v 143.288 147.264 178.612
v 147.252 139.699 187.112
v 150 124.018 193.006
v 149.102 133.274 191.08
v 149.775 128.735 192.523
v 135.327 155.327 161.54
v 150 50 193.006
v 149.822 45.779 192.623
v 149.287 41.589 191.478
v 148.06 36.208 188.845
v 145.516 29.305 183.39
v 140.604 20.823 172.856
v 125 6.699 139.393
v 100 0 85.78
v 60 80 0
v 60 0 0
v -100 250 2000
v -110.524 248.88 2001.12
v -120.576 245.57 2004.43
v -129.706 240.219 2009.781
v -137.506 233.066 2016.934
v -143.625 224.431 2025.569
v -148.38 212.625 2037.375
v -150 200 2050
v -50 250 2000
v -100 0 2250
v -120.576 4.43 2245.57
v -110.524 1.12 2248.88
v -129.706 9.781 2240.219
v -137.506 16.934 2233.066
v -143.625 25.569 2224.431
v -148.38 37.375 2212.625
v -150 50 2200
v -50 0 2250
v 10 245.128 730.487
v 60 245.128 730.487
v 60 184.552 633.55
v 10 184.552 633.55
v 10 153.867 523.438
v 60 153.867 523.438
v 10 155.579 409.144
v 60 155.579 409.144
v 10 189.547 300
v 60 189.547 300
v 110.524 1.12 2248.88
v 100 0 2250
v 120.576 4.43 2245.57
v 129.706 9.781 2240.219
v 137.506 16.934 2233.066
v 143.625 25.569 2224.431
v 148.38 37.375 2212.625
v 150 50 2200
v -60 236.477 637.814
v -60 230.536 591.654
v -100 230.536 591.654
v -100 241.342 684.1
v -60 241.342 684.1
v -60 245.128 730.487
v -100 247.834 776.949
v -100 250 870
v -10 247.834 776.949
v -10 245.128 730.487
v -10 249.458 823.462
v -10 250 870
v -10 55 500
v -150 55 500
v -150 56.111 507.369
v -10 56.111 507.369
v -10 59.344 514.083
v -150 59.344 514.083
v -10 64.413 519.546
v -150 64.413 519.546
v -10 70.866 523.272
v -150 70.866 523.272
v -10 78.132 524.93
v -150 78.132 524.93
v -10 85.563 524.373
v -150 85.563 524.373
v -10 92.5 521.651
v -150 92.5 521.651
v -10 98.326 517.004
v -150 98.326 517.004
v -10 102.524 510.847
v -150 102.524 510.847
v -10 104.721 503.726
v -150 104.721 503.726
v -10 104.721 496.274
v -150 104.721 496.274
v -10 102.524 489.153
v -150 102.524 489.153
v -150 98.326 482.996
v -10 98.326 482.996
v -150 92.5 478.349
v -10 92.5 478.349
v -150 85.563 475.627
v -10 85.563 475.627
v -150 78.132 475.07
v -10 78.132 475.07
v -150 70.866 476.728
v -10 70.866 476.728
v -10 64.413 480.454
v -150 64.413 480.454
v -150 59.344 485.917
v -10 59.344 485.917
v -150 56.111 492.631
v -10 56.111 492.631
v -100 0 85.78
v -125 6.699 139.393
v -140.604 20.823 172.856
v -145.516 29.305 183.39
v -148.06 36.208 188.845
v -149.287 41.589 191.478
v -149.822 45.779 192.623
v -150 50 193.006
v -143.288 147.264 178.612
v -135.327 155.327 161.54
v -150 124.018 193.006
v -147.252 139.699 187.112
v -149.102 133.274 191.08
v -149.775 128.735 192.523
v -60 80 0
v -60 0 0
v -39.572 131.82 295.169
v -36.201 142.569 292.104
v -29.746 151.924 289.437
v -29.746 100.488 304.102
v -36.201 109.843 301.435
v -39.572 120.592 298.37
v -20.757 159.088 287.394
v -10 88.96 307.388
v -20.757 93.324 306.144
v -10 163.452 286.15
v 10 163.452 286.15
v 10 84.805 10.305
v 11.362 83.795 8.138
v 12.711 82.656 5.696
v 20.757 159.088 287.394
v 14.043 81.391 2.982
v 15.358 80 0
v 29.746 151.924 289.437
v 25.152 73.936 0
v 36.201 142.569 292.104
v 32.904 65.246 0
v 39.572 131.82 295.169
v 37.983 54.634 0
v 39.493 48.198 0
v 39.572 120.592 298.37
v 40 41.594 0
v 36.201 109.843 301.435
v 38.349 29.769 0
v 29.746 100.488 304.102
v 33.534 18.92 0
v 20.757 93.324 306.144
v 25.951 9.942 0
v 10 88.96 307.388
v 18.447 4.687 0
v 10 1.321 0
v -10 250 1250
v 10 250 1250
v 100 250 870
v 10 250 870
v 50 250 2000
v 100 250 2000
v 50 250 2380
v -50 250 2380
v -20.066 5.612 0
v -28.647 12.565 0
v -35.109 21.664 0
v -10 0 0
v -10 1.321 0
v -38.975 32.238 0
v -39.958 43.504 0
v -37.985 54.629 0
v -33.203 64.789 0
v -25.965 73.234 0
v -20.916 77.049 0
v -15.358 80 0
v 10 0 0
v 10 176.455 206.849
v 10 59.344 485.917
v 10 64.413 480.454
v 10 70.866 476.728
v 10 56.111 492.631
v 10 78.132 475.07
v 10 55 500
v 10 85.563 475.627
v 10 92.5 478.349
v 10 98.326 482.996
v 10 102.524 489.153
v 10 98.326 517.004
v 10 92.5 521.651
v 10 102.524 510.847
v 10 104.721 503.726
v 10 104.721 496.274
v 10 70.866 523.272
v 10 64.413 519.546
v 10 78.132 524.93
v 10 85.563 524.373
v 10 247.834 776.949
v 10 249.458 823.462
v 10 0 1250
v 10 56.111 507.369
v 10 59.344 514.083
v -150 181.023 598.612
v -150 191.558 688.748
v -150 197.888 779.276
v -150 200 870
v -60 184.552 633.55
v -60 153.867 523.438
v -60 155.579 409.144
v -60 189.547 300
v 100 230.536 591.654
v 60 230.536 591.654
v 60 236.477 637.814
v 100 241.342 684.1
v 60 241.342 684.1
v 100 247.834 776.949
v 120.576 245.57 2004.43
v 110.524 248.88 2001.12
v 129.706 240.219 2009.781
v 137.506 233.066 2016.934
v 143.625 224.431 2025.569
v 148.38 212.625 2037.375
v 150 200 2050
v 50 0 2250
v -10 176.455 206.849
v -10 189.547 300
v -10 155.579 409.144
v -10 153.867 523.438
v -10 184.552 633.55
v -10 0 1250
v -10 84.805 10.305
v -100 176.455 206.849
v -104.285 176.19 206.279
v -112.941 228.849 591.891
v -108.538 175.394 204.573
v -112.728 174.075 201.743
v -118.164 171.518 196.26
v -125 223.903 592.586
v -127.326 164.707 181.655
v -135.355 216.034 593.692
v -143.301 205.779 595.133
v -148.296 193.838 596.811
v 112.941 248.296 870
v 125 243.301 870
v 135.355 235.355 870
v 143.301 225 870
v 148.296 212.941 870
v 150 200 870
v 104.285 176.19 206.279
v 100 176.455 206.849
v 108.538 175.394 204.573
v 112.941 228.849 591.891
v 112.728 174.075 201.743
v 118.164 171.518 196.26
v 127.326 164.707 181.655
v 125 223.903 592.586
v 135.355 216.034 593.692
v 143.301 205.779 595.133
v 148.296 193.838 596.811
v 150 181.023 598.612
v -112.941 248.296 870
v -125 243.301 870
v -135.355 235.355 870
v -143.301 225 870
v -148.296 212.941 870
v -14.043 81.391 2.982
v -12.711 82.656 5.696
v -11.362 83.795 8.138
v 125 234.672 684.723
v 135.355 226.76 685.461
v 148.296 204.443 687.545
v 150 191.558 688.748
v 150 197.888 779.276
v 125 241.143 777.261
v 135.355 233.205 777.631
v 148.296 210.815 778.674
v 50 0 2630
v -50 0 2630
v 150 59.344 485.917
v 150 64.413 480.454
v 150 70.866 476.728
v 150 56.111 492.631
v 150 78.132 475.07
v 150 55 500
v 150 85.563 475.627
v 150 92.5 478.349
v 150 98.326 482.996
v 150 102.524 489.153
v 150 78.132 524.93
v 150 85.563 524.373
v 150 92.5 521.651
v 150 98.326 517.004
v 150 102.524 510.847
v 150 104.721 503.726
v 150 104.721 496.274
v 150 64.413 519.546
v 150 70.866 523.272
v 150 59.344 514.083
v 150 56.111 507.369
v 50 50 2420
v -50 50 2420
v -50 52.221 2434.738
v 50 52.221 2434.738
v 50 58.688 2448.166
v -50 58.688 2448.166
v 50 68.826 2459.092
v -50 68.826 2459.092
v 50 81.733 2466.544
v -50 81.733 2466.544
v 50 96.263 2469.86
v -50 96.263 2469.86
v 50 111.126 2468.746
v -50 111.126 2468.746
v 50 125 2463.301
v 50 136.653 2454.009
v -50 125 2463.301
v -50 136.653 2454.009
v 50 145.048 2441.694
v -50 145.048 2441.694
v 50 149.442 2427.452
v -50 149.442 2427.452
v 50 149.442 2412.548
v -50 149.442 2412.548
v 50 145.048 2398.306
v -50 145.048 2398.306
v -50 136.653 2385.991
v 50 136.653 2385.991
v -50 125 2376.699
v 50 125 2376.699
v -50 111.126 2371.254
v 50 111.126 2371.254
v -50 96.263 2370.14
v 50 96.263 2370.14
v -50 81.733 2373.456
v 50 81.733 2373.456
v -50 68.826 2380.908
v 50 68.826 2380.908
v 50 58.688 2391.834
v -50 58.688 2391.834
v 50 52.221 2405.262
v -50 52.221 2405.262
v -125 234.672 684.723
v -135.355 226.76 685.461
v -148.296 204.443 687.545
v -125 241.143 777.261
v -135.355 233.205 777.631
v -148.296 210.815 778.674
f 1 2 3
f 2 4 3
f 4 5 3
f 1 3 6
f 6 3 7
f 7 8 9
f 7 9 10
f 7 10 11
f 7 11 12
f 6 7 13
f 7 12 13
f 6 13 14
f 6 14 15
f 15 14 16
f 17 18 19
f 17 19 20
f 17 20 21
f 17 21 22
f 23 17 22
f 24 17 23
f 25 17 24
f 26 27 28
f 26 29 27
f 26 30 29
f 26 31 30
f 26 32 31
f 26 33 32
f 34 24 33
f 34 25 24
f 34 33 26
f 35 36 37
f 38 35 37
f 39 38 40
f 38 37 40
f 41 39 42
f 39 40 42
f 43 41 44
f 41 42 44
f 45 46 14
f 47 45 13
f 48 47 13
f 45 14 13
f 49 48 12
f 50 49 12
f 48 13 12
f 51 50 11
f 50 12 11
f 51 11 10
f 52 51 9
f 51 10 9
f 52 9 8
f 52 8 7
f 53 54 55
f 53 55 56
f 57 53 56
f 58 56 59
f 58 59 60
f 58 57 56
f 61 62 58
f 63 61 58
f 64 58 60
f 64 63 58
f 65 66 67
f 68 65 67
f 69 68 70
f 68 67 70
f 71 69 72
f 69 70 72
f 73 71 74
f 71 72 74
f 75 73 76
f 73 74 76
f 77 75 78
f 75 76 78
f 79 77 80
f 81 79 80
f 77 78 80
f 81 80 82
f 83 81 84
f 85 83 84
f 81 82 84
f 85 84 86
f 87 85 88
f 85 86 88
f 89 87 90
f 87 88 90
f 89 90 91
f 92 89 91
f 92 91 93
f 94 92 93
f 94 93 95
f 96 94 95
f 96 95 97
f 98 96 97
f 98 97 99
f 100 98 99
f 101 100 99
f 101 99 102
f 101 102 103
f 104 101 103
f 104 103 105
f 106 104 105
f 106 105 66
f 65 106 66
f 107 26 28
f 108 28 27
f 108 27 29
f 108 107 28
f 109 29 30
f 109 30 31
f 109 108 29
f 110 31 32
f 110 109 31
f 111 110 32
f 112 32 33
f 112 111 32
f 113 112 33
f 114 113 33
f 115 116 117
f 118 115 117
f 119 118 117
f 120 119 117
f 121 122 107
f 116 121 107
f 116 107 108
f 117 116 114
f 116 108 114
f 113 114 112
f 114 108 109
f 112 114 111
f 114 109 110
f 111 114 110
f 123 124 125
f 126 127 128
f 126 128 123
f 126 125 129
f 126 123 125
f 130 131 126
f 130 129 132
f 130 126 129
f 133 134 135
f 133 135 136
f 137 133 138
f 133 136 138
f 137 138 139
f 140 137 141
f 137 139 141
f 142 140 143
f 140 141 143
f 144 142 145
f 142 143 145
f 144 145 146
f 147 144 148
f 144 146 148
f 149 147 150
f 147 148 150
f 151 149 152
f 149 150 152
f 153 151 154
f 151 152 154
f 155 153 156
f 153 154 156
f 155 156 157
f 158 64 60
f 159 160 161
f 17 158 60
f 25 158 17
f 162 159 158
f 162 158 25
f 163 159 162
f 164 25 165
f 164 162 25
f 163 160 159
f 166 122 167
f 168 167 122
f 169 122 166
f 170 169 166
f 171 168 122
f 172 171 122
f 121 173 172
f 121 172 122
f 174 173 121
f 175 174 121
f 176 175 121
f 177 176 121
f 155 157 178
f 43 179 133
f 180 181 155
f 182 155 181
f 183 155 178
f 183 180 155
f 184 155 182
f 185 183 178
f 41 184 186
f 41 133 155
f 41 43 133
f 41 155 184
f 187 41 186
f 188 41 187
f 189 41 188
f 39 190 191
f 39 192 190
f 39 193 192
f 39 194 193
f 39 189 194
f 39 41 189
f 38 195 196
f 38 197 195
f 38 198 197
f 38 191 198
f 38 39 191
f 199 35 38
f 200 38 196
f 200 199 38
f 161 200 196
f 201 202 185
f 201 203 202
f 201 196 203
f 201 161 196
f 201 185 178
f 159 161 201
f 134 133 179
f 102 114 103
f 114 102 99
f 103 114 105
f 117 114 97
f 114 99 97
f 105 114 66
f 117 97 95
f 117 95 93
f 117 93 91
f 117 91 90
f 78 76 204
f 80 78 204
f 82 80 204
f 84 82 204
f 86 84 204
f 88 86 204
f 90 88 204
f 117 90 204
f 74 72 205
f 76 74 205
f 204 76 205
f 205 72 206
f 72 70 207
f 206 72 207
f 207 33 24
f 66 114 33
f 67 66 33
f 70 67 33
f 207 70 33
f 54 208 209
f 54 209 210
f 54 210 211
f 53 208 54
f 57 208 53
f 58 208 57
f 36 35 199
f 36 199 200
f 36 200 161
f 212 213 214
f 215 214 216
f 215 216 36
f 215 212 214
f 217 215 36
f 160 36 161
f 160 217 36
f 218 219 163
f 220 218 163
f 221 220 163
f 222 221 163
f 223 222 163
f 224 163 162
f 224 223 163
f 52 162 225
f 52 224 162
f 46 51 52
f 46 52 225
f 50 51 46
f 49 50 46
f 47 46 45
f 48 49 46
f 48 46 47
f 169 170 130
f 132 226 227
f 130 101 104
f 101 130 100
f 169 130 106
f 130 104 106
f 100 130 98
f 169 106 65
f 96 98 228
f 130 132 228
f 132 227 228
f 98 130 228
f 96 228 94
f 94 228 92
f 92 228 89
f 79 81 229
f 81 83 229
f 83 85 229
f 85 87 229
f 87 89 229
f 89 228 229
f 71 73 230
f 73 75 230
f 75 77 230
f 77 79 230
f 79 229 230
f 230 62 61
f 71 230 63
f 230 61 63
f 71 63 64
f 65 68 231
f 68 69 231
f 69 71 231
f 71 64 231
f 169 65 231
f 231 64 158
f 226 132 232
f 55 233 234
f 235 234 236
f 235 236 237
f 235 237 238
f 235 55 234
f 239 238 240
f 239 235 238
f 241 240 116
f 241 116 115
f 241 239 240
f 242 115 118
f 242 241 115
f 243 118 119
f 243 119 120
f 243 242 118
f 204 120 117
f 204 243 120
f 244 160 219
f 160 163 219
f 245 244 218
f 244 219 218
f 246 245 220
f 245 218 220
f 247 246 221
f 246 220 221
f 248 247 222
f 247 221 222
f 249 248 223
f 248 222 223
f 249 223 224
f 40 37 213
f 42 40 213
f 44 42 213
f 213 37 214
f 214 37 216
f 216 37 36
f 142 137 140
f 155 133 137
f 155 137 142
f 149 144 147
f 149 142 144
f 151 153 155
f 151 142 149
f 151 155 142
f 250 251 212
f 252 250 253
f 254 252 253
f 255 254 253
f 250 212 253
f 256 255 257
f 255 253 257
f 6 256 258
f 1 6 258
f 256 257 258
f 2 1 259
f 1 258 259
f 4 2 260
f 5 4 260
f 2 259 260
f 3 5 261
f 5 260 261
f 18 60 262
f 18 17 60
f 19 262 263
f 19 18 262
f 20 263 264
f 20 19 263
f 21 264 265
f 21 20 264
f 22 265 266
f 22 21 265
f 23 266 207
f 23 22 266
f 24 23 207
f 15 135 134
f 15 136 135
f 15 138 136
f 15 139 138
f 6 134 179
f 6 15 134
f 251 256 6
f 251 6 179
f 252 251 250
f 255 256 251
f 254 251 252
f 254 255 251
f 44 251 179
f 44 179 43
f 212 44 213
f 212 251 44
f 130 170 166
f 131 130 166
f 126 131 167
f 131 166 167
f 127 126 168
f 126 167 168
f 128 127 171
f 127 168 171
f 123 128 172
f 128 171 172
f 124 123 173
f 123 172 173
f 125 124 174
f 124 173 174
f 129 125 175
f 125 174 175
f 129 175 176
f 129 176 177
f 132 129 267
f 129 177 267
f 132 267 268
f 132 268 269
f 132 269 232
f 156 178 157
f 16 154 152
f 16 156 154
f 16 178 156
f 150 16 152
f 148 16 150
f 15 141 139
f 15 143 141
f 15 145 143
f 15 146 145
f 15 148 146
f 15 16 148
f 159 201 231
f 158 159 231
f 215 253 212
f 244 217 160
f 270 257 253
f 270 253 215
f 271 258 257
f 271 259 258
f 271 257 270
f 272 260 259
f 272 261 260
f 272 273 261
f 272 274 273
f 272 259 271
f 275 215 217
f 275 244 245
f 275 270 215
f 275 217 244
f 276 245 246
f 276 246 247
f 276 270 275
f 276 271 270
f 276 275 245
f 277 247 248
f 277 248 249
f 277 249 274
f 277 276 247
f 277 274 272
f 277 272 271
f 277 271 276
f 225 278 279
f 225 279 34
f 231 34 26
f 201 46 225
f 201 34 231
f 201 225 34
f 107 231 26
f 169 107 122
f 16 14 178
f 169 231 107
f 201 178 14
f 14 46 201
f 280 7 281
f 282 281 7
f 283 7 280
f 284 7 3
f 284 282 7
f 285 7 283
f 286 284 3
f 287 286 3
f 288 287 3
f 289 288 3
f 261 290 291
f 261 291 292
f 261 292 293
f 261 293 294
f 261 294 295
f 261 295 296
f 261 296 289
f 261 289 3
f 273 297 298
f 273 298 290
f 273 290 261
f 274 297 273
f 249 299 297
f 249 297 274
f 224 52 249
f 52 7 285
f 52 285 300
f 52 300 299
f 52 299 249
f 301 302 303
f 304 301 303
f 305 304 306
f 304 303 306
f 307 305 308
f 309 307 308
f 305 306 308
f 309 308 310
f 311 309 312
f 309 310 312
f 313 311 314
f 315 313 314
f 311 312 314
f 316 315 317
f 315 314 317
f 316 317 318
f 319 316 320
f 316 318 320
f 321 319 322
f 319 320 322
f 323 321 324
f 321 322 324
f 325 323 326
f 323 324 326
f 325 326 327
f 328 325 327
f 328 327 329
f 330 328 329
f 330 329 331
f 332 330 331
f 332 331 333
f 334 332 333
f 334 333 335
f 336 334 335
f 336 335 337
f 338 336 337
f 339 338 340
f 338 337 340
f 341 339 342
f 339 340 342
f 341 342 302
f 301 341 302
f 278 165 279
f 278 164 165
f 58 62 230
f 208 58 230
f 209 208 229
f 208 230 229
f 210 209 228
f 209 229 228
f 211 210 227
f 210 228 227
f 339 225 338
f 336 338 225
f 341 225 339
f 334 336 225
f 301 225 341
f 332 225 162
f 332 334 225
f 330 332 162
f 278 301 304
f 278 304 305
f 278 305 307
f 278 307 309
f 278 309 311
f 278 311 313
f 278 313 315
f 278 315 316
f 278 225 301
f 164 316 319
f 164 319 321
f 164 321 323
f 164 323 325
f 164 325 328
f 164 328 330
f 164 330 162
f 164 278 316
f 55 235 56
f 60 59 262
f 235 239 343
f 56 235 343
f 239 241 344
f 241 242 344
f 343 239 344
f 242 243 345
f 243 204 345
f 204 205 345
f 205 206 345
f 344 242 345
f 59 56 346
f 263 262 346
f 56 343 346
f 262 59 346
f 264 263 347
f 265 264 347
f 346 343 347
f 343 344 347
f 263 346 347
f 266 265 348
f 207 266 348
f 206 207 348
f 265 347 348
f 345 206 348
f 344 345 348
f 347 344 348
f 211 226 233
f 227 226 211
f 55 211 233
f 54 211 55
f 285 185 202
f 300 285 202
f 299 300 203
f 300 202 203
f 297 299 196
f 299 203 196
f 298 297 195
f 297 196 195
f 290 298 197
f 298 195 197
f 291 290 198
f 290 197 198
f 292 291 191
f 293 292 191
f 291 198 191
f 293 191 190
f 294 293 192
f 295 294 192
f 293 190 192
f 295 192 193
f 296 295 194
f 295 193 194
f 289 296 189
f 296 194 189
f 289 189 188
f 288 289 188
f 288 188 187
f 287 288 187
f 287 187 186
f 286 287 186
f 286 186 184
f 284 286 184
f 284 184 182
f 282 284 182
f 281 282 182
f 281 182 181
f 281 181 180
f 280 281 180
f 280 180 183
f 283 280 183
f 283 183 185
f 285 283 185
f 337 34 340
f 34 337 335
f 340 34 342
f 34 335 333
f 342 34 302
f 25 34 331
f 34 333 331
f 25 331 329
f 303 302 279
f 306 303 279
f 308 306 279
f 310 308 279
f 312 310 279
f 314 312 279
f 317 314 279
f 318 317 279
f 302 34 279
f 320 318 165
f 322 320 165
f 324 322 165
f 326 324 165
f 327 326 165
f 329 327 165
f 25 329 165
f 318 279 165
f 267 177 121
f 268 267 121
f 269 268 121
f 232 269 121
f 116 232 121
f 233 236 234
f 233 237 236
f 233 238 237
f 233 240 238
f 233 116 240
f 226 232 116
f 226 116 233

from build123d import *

# Parameters (mm, degrees)
F1_DEPTH  = 150
F2_DEPTH  = 50
F3_W      = 20
F3_H      = 1250
F4_DEPTH  = 307
F5_R      = 25
F6_DEPTH  = 300.001
F7_R      = 50
F8_DEPTH  = 100
F10_DEPTH = 223
F12_DEPTH = 60
F15_R     = 40
F16_DEPTH = 320
F17_R     = 50


with BuildPart() as f1:
    # F0 (on Right) → F1 (new body, symmetric)
    with BuildSketch(Plane.YZ):
        with BuildLine():
            Line((0, 2250), (0, 0))
            Line((0, 0), (80, 0))
            Line((80, 0), (176.4553832609, 206.8492369235))
            Line((176.4553832609, 206.8492369235), (230.5361374831, 591.6537980799))
            ThreePointArc((230.5361374831, 591.6537980799), (245.1281005196, 730.4870525117), (250, 870))
            Line((250, 870), (250, 2000))
            Line((250, 2000), (0, 2250))
        make_face()
    extrude(amount=F1_DEPTH, both=True)

    # F0 (on Right) → F2 (join, symmetric)
    with BuildSketch(Plane.YZ):
        Polygon((0, 2630), (0, 2250), (250, 2000), (250, 2380), align=None)
    extrude(amount=F2_DEPTH, both=True)

    # F3 (on face) → F4 (cut)
    with BuildSketch(Plane(origin=(0, 250, 0), x_dir=(-1, 0, 0), z_dir=(0, 1, 0))):
        with Locations((0, 625)):
            Rectangle(F3_W, F3_H)
    extrude(amount=-F4_DEPTH, mode=Mode.SUBTRACT)

    # F5 (on face) → F6 (cut, through all)
    with BuildSketch(Plane(origin=(-150, 0, 0), x_dir=(0, -1, 0), z_dir=(-1, 0, 0))):
        with Locations((-80, 500)):
            Circle(F5_R)
    extrude(amount=-F6_DEPTH, mode=Mode.SUBTRACT)

    # F7 (on face) → F8 (cut, through all)
    with BuildSketch(Plane(origin=(-50, 0, 0), x_dir=(0, -1, 0), z_dir=(-1, 0, 0))):
        with Locations((-100, 2420)):
            Circle(F7_R)
    extrude(amount=-F8_DEPTH, mode=Mode.SUBTRACT)

    # F9 (on face) → F10 (cut)
    with BuildSketch(Plane.XZ):
        Polygon((150, 193.0056228459), (60, 0), (150, 0), align=None)
        Polygon((-150, 0), (-60, 0), (-150, 193.0056228459), align=None)
    extrude(amount=-F10_DEPTH, mode=Mode.SUBTRACT)

    # F11 (on Right) → F12 (cut, symmetric)
    with BuildSketch(Plane.YZ):
        with BuildLine():
            ThreePointArc((245.1281005196, 730.4870525117), (153.8671605949, 523.438334328), (189.5468692569, 300))
            Line((189.5468692569, 300), (230.5361374831, 591.6537980799))
            Line((230.5361374831, 591.6537980799), (245.1281005196, 730.4870525117))
        make_face()
        with BuildLine():
            Line((230.5361374831, 591.6537980799), (189.5468692569, 300))
            Line((189.5468692569, 300), (265.2035057545, 311.2672567368))
            Line((265.2035057545, 311.2672567368), (265.2035057545, 409.1856181622))
            Line((265.2035057545, 409.1856181622), (299.6515530456, 510.0366034563))
            Line((299.6515530456, 510.0366034563), (321.972931721, 722.4103352942))
            Line((321.972931721, 722.4103352942), (245.1281005196, 730.4870525117))
            ThreePointArc((245.1281005196, 730.4870525117), (239.0437907365, 660.9430734647), (230.5361374831, 591.6537980799))
        make_face()
        with BuildLine():
            Line((245.1281005196, 730.4870525117), (230.5361374831, 591.6537980799))
            ThreePointArc((230.5361374831, 591.6537980799), (239.0437907365, 660.9430734647), (245.1281005196, 730.4870525117))
        make_face()
    extrude(amount=F12_DEPTH, both=True, mode=Mode.SUBTRACT)

    # F15 (on face) → F16 (cut)
    with BuildSketch(Plane(origin=(0, 0, 0), x_dir=(1, 0, 0), z_dir=(0, -0.2741839815, -0.9616772558))):
        with Locations((0, -40)):
            Circle(F15_R)
    extrude(amount=-F16_DEPTH, mode=Mode.SUBTRACT)

    # F17
    f17_edges = [f1.edges().sort_by_distance(p)[0] for p in [
        (-150, 250, 1435),
        (150, 250, 1435),
        (-150, 245.128101, 730.487053),
        (-150, 203.49576, 399.251518),
        (150, 203.49576, 399.251518),
        (150, 245.128101, 730.487053),
        (-150, 0, 1221.502811),
        (150, 0, 1221.502811),
    ]]
    fillet(f17_edges, radius=F17_R)


solid = f1.part
